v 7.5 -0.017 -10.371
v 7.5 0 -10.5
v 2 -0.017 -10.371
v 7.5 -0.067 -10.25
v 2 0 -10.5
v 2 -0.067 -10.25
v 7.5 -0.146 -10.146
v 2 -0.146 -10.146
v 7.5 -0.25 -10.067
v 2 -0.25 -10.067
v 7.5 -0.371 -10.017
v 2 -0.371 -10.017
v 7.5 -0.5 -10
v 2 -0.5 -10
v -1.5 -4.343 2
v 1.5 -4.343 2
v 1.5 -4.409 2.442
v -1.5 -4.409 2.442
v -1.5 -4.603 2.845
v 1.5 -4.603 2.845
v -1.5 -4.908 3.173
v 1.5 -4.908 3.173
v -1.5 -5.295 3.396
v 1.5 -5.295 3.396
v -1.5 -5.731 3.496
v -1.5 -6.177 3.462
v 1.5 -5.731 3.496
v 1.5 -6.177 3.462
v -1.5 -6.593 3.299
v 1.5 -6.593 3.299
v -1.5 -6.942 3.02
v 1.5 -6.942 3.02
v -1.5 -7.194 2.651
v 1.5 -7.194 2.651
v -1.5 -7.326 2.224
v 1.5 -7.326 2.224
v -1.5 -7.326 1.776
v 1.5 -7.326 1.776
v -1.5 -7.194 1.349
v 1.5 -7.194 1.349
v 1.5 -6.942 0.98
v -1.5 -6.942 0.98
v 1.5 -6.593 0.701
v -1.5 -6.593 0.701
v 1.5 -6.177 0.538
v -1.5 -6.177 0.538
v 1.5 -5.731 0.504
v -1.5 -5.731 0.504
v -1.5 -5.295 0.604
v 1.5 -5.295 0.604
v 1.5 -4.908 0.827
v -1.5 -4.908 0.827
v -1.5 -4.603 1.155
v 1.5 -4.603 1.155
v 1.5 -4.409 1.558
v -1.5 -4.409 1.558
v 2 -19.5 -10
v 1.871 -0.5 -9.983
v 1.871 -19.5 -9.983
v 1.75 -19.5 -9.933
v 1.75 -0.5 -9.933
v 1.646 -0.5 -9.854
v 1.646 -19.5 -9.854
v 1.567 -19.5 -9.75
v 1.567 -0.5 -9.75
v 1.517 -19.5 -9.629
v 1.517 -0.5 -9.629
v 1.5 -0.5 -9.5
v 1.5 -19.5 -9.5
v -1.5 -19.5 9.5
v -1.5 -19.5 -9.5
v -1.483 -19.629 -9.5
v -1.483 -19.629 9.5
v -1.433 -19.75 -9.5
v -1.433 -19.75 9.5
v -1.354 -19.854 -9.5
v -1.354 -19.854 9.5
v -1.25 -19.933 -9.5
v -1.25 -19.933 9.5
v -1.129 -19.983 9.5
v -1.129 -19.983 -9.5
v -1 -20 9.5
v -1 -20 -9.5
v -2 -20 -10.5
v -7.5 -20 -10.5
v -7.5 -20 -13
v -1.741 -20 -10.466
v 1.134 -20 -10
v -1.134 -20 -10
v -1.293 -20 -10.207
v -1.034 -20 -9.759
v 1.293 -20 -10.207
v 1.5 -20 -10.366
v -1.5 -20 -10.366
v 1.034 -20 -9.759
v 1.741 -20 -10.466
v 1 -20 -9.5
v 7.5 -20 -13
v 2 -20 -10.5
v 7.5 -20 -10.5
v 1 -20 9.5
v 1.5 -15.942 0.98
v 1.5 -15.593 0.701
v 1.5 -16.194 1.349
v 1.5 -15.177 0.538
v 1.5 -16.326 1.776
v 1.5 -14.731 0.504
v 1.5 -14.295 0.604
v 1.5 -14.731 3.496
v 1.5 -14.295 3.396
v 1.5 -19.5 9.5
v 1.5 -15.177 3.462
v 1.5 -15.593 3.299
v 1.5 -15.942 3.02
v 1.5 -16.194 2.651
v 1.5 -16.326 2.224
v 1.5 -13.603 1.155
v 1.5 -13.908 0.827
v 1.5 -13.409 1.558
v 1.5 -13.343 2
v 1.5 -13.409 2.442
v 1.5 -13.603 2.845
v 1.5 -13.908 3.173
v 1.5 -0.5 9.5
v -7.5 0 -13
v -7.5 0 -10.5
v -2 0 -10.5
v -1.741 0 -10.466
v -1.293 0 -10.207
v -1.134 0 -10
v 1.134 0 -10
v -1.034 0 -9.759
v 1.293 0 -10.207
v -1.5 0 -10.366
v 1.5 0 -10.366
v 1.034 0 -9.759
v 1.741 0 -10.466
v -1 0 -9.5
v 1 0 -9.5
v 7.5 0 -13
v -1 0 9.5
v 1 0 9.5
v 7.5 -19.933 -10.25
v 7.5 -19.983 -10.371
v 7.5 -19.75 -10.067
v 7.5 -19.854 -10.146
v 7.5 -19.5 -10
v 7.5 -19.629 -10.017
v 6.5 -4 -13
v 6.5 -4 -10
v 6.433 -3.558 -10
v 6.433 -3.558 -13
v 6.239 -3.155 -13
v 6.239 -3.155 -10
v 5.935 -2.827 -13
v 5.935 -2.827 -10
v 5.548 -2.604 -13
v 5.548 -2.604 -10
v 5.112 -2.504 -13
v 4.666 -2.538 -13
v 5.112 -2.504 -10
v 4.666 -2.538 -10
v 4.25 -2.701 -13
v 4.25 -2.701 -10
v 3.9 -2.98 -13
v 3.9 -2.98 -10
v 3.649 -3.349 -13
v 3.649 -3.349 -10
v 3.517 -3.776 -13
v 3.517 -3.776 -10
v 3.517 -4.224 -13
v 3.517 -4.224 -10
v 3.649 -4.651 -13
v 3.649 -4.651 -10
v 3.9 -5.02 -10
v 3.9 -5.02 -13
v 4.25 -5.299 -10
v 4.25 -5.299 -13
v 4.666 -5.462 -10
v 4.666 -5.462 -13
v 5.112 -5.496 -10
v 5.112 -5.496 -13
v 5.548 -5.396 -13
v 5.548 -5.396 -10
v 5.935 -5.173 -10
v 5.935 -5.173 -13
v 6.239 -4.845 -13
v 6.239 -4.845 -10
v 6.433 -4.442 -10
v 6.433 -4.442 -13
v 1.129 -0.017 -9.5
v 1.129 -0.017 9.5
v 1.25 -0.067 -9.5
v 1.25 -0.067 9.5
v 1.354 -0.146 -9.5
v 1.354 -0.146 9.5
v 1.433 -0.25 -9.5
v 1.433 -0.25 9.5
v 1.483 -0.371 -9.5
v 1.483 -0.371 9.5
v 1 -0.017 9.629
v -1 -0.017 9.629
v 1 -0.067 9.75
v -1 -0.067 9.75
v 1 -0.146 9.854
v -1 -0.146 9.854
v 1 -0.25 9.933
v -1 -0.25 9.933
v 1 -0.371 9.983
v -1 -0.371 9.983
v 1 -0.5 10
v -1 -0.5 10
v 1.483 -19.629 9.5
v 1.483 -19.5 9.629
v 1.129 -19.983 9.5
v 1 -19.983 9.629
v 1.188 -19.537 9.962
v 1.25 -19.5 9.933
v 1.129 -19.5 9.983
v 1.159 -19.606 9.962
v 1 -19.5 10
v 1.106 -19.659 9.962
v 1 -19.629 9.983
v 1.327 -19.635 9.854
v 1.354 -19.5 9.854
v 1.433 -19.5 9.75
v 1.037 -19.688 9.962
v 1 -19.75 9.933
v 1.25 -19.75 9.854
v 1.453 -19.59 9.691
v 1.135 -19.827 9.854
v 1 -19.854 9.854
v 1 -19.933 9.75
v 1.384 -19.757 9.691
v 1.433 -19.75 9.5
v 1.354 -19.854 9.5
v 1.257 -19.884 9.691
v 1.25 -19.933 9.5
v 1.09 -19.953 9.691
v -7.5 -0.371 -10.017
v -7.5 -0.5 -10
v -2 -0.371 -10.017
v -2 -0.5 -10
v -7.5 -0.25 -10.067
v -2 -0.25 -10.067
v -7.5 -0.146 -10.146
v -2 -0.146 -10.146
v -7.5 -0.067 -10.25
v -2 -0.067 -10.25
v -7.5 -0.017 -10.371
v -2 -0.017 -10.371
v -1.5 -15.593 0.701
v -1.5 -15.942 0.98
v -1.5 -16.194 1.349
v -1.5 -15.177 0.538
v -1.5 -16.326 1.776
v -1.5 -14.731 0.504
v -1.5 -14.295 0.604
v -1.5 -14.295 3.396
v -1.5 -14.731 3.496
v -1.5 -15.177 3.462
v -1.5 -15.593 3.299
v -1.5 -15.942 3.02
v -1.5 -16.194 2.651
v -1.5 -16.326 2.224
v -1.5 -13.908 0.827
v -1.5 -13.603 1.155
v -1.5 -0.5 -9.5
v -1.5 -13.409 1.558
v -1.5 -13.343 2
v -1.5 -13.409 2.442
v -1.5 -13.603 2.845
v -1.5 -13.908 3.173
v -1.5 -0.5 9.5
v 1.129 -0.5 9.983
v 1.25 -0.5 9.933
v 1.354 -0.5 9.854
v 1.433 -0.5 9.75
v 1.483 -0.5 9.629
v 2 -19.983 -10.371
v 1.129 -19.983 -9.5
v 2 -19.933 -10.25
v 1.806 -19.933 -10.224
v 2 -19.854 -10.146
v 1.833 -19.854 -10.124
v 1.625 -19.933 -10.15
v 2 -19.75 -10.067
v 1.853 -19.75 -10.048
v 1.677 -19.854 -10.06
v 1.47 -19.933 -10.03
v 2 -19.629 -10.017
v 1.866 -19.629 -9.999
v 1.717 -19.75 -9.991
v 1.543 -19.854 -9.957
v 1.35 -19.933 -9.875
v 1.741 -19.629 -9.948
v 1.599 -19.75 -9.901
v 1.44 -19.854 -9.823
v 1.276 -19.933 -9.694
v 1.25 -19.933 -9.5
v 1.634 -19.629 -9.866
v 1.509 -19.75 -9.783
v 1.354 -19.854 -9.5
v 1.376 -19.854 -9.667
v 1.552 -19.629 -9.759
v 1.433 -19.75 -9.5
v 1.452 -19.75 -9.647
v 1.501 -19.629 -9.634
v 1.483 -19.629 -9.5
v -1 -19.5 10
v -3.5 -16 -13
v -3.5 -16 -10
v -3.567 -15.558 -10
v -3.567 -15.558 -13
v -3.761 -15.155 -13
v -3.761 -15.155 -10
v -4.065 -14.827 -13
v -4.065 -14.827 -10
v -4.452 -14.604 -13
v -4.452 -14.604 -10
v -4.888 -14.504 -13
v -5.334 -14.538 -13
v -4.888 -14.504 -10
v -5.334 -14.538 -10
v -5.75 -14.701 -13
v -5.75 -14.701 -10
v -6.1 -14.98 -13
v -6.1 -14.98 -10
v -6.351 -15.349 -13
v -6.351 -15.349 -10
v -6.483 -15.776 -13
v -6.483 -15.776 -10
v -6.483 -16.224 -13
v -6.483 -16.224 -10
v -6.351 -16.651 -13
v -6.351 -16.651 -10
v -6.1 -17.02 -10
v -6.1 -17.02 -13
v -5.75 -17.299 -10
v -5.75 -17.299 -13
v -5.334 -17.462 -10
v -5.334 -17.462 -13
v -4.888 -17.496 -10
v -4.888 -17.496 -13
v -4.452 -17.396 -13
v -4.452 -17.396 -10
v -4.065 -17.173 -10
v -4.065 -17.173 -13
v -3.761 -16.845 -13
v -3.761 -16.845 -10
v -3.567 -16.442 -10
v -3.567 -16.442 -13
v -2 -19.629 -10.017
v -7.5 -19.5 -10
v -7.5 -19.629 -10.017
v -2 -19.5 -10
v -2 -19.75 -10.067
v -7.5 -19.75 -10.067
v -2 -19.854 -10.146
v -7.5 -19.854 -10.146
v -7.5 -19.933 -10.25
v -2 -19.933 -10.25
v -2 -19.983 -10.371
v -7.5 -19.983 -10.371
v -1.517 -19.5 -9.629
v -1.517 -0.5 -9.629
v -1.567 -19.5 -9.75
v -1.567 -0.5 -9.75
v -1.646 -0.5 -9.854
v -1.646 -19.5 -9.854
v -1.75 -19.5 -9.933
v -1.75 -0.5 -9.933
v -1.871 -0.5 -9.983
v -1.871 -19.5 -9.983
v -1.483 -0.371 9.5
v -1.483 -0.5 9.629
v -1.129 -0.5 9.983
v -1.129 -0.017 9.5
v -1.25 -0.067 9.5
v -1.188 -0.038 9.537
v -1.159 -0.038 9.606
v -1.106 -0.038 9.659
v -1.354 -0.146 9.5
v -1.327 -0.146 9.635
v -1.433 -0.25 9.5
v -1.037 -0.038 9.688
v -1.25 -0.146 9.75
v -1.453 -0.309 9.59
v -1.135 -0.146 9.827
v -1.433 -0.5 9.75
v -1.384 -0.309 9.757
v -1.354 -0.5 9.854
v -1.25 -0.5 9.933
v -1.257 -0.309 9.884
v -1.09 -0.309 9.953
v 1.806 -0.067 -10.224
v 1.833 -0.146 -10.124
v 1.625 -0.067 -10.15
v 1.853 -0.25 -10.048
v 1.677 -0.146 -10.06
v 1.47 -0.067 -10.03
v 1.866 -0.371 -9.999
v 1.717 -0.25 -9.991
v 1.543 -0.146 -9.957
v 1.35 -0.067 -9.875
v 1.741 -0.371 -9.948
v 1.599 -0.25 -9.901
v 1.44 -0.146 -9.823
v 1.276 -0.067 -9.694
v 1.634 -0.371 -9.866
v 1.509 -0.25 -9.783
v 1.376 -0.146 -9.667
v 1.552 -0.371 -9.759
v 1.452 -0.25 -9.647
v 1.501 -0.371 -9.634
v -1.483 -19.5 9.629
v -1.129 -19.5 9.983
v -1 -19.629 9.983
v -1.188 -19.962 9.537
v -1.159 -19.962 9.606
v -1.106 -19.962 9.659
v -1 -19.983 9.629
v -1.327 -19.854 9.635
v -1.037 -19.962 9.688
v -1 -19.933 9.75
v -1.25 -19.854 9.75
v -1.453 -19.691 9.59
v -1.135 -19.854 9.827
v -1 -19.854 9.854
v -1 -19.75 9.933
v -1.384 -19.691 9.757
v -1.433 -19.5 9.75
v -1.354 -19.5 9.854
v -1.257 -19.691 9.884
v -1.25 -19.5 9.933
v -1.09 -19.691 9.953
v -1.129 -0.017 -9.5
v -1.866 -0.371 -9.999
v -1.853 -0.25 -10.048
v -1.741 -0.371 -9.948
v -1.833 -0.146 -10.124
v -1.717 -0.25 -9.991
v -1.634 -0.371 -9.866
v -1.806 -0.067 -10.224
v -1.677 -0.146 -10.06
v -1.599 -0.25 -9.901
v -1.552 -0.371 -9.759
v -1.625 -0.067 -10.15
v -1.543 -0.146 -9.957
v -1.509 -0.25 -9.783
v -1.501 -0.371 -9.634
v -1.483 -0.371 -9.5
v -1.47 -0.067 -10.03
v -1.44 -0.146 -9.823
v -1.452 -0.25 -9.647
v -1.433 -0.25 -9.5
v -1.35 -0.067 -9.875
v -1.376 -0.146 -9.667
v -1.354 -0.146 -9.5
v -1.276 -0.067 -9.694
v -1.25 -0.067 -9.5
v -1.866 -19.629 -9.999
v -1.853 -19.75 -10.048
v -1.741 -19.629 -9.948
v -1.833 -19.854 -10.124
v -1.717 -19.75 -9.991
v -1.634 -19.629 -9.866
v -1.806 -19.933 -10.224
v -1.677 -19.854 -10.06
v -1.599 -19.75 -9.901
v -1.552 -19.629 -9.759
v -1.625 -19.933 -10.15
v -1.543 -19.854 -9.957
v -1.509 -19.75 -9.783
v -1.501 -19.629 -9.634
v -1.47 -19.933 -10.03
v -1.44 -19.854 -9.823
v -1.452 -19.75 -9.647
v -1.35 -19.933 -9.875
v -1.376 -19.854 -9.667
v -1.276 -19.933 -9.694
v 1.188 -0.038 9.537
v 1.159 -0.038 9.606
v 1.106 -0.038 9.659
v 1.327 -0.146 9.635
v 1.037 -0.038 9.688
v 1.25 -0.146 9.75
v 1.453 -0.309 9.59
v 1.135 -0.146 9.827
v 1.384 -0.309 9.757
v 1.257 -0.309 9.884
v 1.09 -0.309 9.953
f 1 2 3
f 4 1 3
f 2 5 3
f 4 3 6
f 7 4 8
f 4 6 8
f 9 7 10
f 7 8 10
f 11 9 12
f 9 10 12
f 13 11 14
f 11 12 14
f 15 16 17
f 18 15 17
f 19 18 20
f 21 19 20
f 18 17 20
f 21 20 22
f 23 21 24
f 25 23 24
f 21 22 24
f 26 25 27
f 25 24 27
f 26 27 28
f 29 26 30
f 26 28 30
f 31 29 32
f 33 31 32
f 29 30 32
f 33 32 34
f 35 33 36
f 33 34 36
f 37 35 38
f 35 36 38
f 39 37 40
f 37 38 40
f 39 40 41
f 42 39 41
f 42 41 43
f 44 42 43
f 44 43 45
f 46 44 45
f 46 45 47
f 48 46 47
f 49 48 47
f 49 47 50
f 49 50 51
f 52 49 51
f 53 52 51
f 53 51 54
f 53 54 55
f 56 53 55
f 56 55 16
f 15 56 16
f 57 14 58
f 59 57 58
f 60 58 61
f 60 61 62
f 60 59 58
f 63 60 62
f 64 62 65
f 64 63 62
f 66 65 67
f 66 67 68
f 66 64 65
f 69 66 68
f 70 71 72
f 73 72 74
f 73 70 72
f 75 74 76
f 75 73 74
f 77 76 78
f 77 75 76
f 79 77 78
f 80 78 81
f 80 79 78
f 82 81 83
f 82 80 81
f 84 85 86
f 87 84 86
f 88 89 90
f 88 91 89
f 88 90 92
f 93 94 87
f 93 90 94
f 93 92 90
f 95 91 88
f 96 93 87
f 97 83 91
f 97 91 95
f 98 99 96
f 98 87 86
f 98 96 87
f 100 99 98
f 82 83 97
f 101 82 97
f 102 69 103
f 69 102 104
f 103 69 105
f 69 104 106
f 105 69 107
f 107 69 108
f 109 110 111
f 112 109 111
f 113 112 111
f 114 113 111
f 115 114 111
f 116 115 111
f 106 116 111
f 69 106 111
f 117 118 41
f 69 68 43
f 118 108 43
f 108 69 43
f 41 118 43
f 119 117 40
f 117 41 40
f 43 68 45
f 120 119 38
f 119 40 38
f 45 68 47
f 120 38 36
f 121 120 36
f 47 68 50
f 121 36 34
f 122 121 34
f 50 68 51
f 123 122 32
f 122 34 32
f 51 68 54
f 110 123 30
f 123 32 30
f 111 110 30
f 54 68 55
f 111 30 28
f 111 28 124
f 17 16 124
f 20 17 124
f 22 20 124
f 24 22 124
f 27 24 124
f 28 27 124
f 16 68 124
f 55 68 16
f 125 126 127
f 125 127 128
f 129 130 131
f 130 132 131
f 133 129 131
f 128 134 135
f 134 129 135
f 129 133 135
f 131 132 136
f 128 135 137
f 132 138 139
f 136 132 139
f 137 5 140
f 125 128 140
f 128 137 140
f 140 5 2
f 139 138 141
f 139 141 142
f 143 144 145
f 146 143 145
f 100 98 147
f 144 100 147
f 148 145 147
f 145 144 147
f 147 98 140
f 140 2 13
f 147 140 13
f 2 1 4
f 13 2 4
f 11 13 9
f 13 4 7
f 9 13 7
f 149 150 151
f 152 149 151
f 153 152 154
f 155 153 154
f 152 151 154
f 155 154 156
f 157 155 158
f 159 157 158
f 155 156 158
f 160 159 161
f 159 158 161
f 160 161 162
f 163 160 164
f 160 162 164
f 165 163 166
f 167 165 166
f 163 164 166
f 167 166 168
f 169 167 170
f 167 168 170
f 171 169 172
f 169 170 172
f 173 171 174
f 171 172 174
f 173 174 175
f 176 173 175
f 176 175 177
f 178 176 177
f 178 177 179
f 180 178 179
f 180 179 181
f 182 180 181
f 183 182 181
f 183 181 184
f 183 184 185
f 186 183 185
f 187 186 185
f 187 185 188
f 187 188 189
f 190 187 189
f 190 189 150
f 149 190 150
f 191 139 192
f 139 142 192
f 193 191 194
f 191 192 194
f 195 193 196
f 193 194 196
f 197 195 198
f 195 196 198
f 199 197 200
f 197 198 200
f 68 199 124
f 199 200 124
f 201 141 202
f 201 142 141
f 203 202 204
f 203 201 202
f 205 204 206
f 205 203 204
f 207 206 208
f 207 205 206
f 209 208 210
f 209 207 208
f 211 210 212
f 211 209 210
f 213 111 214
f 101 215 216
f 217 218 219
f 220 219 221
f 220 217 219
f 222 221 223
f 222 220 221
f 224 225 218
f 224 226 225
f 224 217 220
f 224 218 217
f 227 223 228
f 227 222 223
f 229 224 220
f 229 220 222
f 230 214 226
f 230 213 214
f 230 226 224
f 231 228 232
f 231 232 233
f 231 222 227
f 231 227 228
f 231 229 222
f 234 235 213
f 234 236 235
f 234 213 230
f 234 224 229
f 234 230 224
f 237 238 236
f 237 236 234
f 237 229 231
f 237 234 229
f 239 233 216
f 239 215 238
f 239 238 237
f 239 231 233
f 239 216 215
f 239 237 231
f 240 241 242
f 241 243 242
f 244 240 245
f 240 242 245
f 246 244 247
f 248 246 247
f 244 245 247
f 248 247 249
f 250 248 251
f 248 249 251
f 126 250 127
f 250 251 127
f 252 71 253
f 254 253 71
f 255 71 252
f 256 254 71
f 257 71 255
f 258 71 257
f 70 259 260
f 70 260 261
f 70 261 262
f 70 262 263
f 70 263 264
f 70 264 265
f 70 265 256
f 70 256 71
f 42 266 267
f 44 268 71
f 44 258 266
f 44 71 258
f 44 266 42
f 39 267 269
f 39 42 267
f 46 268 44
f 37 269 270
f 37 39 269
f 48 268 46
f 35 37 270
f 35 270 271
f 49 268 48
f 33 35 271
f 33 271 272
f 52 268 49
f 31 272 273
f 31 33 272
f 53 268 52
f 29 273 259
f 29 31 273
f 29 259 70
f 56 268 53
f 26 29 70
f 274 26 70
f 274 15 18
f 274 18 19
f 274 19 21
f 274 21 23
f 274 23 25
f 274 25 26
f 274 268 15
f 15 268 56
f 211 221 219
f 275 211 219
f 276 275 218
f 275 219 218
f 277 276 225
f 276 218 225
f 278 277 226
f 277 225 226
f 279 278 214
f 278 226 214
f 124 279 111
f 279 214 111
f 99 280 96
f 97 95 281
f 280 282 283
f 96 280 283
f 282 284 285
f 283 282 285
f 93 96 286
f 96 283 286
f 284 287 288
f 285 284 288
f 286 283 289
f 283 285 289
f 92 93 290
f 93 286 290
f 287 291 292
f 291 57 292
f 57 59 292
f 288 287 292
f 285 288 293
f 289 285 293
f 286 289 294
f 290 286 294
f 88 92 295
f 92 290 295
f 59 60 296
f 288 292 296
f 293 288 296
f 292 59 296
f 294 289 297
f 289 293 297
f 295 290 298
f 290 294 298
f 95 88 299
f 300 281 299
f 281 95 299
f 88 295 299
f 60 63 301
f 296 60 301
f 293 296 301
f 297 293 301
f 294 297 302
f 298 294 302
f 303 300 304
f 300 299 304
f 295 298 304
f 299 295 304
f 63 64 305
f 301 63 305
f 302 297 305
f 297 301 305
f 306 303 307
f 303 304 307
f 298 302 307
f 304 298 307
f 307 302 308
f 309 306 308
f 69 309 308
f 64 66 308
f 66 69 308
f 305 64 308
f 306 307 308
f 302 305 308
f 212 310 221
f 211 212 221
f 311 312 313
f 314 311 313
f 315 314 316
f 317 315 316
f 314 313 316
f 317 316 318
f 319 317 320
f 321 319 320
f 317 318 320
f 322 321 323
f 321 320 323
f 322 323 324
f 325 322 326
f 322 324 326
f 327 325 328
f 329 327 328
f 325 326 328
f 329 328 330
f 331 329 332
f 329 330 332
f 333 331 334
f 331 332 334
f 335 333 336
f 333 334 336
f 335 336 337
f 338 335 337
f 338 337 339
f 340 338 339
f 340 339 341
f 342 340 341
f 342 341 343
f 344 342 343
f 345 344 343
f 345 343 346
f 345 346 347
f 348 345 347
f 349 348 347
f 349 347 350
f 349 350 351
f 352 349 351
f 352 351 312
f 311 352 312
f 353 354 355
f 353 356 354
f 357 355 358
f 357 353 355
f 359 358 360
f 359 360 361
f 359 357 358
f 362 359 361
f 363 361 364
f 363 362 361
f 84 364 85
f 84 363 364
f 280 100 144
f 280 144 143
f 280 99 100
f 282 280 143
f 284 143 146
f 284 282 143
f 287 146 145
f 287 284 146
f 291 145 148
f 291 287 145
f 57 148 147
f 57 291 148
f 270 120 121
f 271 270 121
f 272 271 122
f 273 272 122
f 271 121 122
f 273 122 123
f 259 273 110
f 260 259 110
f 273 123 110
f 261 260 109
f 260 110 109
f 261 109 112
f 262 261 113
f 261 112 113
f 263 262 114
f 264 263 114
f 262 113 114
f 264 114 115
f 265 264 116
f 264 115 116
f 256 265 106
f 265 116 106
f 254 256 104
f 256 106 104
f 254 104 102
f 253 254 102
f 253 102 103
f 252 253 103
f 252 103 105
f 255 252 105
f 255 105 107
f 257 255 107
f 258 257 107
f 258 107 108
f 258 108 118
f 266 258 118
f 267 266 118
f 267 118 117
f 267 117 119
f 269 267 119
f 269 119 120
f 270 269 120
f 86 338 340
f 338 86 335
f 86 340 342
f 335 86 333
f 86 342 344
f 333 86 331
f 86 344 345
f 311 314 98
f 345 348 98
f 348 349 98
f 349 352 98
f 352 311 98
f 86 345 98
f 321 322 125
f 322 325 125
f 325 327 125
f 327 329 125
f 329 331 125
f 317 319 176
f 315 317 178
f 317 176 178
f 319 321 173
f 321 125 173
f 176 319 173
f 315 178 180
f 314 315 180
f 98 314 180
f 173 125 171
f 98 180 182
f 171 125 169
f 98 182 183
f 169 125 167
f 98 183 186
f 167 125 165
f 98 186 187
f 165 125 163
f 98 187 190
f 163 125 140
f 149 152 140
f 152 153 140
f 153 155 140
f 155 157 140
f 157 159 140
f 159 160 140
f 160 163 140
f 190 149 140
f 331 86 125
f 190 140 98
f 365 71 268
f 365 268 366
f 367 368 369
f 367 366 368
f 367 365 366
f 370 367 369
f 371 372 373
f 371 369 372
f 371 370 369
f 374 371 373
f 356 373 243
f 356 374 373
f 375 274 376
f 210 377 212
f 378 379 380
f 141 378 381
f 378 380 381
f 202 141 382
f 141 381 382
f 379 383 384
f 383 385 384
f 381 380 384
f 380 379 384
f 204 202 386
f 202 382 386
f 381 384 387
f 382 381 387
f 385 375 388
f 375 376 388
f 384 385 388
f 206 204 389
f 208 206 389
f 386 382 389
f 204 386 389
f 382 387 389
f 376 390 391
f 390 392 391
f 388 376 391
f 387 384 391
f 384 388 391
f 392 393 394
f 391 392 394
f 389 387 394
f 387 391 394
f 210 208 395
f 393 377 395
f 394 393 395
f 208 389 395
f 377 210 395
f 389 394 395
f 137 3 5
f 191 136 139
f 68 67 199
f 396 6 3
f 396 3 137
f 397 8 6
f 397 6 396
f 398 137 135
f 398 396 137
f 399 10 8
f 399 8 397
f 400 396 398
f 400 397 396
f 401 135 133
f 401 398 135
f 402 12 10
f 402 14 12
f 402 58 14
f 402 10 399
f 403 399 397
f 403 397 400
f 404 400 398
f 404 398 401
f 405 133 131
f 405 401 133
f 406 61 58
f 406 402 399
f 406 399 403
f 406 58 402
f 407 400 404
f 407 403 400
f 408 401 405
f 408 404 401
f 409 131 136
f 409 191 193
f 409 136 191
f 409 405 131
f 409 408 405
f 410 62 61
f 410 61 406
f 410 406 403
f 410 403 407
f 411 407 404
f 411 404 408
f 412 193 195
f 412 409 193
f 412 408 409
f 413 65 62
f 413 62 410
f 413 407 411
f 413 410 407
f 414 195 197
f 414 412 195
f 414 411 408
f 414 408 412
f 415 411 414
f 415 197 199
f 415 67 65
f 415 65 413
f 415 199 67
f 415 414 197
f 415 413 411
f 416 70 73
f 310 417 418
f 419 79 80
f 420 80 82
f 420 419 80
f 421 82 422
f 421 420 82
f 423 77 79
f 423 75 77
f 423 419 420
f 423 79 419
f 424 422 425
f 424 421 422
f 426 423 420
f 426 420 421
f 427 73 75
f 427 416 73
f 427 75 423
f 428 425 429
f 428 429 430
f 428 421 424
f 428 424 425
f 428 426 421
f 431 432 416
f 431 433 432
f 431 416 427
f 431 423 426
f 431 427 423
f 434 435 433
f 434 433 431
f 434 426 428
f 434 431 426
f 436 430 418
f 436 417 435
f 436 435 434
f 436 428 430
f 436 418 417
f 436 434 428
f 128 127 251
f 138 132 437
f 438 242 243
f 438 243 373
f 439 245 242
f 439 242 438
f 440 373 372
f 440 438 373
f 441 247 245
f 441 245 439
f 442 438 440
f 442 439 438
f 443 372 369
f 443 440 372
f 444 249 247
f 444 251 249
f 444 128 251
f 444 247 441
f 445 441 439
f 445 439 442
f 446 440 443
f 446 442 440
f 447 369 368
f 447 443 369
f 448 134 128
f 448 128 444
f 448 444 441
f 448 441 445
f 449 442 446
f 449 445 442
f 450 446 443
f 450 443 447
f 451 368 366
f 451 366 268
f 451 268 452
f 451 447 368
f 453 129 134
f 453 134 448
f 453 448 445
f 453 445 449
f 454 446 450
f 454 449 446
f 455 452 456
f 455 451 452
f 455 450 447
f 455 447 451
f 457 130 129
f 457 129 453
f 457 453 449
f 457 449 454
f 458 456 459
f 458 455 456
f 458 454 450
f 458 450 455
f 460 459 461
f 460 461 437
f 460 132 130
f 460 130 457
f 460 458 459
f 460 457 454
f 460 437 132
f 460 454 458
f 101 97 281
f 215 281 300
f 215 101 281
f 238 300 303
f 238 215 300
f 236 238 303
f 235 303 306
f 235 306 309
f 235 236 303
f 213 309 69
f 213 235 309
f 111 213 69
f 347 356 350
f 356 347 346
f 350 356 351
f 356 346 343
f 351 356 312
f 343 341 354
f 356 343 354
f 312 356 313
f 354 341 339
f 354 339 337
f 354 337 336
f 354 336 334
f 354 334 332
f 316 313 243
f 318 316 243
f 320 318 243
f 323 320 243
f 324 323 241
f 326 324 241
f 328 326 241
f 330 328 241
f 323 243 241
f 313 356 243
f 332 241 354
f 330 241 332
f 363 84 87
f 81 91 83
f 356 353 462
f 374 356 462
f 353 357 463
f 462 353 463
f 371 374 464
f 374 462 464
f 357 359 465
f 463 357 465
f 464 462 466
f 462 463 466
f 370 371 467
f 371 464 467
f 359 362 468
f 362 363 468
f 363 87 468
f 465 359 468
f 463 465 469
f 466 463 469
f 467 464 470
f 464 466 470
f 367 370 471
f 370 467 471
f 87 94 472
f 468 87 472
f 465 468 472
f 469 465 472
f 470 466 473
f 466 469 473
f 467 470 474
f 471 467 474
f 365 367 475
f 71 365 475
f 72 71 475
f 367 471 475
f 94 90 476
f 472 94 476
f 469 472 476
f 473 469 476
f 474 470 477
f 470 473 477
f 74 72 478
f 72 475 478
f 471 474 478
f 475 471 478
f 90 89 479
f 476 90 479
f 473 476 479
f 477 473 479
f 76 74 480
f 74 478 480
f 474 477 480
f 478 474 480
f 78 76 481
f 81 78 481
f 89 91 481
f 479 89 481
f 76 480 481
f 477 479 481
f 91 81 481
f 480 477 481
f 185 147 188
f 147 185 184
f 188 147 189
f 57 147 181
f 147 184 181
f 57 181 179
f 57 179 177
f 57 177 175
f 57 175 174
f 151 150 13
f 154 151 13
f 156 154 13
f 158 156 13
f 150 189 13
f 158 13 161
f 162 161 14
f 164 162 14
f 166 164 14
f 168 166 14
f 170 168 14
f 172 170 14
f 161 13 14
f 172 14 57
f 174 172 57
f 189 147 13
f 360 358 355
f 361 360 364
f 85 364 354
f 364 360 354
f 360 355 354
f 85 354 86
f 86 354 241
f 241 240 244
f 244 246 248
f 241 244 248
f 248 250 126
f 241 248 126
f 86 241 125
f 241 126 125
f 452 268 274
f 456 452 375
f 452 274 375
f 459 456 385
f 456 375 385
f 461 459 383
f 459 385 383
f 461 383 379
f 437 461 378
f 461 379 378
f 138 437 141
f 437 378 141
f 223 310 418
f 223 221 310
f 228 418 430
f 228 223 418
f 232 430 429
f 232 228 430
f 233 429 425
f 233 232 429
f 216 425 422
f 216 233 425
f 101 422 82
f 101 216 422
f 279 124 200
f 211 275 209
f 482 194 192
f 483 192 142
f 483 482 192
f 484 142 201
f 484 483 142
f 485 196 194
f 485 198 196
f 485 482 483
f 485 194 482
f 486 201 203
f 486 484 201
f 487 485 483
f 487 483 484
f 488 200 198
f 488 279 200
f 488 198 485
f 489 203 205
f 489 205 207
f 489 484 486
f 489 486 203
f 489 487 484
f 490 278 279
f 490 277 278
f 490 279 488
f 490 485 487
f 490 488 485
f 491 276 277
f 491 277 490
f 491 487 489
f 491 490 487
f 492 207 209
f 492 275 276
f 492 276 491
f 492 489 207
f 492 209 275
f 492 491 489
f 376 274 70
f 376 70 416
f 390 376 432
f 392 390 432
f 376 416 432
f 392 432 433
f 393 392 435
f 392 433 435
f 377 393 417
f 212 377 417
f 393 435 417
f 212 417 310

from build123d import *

# Parameters (mm, degrees)
F0_W     = 3
F0_H     = 20
F1_DEPTH = 20
F2_R     = 1.5
F3_DEPTH = 9.001
F4_R     = 1.5
F5_DEPTH = 3.001
F6_R     = 1.5
F7_DEPTH = 25
F8_F1_R  = 0.5
F8_F2_R  = 0.5


with BuildPart() as f1:
    # F0 (on Front) → F1 (new body)
    with BuildSketch(Plane.XZ):
        Rectangle(F0_W, F0_H)
        Polygon((7.5, -10), (1.5, -10), (-1.5, -10), (-7.5, -10), (-7.5, -13), (7.5, -13), align=None)
    extrude(amount=F1_DEPTH)

    # F2 (on face) → F3 (cut, through all)
    with BuildSketch(Plane.YZ.offset(1.5)):
        with Locations((-14.8428049088, 2)):
            Circle(F2_R)
        with Locations((-5.8428049088, 2)):
            Circle(F2_R)
    extrude(amount=-F3_DEPTH, mode=Mode.SUBTRACT)

    # F4 (on face) → F5 (cut, through all)
    with BuildSketch(Plane.XY.offset(-10)):
        with Locations((5, -4)):
            Circle(F4_R)
    extrude(amount=-F5_DEPTH, mode=Mode.SUBTRACT)

    # F6 (on face) → F7 (cut)
    with BuildSketch(Plane.XY.offset(-10)):
        with Locations((-5, -16)):
            Circle(F6_R)
    extrude(amount=-F7_DEPTH, mode=Mode.SUBTRACT)

    # F8: fillet of radius 0.5 on 10 edges, made by hand

    # F8_f1
    f8_f1_edges = [f1.edges().sort_by_distance(p)[0] for p in [
        (1.5, -10, -10),
        (-1.5, -10, -10),
    ]]
    fillet(f8_f1_edges, radius=F8_F1_R)

    # F8_f2
    f8_f2_edges = [f1.edges().sort_by_distance(p)[0] for p in [
        (-1.5, -10, 10),
        (1.5, -20, 0.25),
        (-1.5, -20, 0.25),
        (1.5, -10, 10),
        (-1.5, 0, 0.25),
        (1.5, 0, 0.25),
        (0, -20, 10),
        (0, 0, 10),
        (1.6464466094, 0, -9.8535533906),
        (-1.6464466094, 0, -9.8535533906),
        (-1.6464466094, -20, -9.8535533906),
        (1.6464466094, -20, -9.8535533906),
    ]]
    fillet(f8_f2_edges, radius=F8_F2_R)


solid = f1.part
